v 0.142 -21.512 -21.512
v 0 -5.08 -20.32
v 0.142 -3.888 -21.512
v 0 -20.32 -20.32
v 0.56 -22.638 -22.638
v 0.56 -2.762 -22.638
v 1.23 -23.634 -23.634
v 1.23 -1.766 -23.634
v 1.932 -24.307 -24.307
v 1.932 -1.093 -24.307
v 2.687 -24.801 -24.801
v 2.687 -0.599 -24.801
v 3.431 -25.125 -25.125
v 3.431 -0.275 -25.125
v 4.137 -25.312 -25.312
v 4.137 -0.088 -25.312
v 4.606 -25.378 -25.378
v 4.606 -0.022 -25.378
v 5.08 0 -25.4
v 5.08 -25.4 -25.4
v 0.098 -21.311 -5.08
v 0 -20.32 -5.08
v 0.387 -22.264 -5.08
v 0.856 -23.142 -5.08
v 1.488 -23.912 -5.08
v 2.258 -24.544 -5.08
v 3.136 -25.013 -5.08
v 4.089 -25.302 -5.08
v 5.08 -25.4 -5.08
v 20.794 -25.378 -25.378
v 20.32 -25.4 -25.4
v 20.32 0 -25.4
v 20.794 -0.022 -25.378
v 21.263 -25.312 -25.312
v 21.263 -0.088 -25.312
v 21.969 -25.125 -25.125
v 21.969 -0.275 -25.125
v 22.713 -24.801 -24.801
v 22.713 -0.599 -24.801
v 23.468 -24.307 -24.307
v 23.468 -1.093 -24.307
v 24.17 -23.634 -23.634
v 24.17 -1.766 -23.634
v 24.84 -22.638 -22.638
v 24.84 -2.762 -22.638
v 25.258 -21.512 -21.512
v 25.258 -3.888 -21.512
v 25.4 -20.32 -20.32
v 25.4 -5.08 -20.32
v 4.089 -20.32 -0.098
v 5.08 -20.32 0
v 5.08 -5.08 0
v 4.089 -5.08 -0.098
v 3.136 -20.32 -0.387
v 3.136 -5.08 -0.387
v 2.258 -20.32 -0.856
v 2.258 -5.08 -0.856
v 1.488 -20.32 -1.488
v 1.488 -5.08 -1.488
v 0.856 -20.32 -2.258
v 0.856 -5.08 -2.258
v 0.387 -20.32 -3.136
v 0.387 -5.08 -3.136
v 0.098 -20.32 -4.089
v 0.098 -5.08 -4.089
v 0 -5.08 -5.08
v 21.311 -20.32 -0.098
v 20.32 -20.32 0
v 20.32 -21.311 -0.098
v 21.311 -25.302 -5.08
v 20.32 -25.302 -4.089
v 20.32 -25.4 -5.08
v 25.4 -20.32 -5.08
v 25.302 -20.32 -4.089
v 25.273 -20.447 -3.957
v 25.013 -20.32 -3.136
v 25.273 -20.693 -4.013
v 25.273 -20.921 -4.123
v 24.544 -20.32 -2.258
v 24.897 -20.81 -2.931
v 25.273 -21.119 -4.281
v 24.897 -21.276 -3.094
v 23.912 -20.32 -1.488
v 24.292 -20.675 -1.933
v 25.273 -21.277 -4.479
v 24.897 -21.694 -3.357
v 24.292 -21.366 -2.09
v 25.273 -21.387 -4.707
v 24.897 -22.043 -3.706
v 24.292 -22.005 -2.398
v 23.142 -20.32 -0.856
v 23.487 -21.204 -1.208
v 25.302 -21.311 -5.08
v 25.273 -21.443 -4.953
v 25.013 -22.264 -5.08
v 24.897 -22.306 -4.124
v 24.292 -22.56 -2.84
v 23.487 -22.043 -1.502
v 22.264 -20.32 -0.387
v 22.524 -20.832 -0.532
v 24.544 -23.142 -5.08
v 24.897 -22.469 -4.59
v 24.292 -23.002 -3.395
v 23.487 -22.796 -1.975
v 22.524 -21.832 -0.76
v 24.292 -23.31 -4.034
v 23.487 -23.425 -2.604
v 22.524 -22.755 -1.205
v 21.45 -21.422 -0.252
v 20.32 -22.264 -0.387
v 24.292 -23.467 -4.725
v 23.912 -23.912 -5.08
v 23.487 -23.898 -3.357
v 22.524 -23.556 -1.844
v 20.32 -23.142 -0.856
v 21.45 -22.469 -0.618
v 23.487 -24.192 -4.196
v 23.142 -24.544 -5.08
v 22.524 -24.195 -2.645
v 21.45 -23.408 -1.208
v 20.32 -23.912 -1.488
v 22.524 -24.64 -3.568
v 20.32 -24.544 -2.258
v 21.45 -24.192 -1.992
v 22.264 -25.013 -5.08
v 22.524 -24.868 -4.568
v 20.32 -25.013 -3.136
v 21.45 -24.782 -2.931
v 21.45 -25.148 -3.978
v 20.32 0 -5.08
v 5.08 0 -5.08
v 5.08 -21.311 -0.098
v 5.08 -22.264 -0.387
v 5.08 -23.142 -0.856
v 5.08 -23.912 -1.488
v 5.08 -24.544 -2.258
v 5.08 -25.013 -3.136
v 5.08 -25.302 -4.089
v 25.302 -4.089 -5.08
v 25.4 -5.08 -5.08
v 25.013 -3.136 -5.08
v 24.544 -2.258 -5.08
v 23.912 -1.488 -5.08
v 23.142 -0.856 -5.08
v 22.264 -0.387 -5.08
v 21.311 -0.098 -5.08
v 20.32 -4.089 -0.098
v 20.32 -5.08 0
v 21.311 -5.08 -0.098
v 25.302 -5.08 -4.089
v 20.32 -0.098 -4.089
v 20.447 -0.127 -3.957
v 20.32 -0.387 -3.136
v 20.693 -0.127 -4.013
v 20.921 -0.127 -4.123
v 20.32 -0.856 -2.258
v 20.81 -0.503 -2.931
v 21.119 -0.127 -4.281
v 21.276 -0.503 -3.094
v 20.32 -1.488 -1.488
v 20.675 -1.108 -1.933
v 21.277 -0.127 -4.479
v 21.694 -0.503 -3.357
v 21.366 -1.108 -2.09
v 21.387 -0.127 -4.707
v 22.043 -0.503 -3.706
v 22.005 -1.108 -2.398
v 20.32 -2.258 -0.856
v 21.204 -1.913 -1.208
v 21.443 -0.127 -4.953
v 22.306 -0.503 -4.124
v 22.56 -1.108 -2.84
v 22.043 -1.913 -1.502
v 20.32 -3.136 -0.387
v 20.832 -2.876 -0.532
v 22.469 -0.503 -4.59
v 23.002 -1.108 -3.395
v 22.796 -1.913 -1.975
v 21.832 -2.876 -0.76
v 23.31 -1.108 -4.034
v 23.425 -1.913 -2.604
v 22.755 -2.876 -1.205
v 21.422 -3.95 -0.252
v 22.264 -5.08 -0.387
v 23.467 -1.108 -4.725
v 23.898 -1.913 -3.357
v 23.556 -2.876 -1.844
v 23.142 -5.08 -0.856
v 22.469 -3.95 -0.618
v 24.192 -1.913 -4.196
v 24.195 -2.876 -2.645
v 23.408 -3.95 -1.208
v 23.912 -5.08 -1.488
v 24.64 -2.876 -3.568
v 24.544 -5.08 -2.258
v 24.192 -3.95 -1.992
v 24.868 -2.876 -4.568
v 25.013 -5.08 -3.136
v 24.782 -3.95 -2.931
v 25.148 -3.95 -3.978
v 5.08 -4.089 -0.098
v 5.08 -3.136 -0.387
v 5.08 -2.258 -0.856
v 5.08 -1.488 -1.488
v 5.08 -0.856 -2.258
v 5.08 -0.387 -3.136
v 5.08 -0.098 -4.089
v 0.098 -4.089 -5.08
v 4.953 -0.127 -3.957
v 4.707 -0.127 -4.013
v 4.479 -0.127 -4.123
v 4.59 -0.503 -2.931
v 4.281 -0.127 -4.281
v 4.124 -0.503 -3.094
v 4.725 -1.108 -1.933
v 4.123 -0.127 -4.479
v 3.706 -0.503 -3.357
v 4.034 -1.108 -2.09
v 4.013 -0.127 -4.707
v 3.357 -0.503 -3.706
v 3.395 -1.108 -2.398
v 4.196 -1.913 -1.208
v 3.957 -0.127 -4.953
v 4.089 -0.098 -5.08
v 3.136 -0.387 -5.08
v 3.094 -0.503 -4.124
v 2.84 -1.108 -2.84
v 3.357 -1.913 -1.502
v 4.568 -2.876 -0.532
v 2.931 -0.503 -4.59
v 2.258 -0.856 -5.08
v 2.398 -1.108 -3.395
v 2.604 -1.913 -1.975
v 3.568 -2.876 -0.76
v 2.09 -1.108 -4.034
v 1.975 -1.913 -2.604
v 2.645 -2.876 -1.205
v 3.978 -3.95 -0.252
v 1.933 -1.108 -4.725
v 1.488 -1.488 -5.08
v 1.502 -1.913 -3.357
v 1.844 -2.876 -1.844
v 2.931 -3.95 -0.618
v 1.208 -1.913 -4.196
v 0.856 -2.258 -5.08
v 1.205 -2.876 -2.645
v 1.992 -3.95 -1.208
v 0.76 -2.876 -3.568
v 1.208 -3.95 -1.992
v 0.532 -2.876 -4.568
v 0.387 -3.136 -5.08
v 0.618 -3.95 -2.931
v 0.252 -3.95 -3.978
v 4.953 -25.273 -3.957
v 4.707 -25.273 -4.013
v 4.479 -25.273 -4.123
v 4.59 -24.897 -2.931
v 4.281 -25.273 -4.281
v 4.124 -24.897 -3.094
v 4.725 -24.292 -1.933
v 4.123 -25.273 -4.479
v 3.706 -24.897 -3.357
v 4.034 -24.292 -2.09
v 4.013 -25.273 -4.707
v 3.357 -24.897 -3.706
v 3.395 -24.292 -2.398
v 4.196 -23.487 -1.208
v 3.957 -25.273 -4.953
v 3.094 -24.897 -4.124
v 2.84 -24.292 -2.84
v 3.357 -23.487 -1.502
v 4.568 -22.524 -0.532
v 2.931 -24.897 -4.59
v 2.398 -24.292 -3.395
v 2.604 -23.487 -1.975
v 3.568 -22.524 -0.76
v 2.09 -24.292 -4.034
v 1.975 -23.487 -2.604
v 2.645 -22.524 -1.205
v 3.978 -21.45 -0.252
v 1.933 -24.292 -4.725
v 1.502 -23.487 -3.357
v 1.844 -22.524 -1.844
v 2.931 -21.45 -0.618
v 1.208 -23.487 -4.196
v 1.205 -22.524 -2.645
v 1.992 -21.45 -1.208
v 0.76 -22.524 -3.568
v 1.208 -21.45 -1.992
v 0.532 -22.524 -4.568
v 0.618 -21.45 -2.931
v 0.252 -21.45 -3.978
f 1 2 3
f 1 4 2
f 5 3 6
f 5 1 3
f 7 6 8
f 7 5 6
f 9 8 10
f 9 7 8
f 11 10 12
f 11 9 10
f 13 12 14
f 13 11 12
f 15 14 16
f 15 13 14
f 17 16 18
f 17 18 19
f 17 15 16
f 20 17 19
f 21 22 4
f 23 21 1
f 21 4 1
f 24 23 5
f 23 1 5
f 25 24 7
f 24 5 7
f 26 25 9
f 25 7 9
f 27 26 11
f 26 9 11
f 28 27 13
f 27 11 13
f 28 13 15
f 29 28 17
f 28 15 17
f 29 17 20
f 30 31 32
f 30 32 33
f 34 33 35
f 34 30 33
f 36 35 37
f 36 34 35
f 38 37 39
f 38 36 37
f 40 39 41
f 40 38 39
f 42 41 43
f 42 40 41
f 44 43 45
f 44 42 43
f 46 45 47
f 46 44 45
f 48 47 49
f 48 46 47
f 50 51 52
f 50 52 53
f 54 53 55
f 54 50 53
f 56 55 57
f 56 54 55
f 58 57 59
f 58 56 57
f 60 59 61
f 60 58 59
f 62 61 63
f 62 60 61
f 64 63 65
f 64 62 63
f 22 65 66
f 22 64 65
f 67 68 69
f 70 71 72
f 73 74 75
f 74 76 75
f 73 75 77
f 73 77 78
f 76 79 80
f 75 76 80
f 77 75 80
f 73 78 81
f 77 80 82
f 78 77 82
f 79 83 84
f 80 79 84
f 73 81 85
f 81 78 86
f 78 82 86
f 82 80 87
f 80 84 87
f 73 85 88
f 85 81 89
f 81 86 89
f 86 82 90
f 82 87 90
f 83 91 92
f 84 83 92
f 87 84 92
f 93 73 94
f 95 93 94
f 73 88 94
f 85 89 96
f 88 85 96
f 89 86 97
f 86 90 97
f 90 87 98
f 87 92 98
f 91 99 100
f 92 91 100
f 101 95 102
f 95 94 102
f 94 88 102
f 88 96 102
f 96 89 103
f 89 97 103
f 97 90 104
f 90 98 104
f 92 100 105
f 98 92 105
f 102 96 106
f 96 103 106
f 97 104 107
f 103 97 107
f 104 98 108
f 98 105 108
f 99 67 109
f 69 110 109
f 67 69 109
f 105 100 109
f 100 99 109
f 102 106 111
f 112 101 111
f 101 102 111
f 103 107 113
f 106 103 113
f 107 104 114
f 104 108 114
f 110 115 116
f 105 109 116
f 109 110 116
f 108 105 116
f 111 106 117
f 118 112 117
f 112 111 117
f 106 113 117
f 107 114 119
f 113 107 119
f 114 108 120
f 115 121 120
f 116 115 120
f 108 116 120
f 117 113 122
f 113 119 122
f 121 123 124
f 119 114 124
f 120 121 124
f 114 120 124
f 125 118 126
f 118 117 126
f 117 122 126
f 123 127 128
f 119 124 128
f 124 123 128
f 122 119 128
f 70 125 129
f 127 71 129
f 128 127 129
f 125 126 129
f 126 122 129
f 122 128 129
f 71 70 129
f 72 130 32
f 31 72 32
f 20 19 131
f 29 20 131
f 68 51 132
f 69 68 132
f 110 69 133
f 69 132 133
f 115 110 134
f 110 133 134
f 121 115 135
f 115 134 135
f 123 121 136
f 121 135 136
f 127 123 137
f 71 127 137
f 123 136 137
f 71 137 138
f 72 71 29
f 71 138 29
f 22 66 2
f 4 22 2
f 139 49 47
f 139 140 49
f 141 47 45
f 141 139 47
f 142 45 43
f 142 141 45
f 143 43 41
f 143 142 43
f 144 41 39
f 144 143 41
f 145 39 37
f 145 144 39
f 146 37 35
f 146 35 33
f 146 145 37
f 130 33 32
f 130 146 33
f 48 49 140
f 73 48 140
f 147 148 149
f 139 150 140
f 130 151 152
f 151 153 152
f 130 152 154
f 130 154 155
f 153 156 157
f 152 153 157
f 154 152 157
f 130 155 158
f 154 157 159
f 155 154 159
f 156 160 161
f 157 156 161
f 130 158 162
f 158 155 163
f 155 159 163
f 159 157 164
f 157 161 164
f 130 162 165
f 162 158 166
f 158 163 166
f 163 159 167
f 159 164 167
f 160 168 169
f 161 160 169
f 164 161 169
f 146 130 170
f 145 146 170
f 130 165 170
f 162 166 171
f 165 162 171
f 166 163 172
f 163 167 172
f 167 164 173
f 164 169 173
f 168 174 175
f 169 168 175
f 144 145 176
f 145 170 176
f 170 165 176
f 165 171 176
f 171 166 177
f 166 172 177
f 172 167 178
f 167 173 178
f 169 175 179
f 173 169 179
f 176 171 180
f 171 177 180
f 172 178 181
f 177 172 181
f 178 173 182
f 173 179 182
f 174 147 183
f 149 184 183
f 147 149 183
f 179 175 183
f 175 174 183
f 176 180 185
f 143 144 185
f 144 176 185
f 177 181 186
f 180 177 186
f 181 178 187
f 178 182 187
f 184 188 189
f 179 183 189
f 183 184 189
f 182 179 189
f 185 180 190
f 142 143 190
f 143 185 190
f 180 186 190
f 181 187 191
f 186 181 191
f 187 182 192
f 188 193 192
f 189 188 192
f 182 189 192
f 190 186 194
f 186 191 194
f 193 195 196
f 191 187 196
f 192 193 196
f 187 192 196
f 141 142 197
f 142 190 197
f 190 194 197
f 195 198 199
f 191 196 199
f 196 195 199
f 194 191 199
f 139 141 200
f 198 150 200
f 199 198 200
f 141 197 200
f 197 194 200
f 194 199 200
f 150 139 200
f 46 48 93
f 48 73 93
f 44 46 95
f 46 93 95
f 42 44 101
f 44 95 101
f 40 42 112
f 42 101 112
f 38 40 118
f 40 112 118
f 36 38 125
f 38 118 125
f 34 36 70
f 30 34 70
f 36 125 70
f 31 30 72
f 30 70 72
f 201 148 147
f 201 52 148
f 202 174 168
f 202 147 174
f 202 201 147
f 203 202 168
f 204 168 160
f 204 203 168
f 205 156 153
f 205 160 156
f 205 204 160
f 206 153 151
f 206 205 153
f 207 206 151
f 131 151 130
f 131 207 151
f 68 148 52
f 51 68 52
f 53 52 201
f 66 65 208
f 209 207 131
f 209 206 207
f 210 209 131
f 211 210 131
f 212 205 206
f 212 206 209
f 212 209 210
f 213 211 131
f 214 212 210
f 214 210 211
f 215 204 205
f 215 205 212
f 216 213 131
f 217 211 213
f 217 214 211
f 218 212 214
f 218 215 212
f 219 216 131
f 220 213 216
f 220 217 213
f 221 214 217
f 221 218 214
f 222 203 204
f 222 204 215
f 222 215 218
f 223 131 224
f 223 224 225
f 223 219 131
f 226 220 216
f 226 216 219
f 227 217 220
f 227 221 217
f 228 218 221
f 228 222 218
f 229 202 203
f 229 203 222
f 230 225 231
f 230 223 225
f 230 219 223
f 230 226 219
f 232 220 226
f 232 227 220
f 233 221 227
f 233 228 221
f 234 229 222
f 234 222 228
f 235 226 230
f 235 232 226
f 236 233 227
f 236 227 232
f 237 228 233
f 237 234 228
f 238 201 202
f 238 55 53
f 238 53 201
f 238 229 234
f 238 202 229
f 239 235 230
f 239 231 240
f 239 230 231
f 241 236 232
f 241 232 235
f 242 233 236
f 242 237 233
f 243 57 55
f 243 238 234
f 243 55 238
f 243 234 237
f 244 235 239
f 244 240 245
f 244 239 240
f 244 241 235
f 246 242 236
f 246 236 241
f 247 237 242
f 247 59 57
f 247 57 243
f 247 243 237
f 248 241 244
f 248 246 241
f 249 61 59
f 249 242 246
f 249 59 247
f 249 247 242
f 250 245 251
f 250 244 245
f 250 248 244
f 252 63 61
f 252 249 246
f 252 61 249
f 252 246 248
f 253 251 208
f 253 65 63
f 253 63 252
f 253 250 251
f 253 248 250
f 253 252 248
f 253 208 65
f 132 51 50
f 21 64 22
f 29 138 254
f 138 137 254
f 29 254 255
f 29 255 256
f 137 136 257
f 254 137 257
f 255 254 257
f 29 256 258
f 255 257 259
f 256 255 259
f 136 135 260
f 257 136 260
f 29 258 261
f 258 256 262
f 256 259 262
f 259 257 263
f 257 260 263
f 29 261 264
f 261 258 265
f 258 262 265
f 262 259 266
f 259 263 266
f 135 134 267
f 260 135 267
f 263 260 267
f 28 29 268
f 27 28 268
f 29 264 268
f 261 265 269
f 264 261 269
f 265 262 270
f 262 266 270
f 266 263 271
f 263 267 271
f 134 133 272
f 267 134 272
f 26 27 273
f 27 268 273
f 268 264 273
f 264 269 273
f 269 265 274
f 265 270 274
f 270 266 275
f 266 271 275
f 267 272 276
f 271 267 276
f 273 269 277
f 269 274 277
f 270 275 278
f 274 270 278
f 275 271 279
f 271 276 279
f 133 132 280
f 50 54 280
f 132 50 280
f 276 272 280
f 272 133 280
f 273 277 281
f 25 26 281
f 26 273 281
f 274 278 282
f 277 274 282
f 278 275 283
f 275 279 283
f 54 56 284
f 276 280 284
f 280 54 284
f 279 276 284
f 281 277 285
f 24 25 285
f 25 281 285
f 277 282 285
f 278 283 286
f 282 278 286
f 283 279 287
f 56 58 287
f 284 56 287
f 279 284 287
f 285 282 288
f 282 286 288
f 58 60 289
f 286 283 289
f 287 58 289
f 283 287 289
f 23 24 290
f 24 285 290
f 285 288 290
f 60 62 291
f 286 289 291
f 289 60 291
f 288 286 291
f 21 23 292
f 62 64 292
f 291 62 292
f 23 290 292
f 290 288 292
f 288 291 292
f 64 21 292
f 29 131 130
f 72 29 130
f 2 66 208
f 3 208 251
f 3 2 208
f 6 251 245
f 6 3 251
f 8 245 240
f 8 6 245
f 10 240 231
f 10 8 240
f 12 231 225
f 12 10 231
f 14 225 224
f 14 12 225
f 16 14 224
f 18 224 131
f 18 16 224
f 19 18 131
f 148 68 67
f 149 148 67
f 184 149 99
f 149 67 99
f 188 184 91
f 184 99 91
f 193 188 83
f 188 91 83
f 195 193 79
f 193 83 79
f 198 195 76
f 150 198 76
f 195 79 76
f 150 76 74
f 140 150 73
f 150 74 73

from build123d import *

# Parameters (mm, degrees)
F1_DEPTH = 25.4
F2_R     = 5.07999


# Not quite as in the source:
# - a fillet or chamfer is up to 0.001 mm smaller than in the source, because OpenCascade refuses the exact size


with BuildPart() as f1:
    # F0 (on Front) → F1 (new body)
    with BuildSketch(Plane.XZ):
        Polygon((25.4, 0), (0, 0), (0, -25.4), (5.08, -25.4), (5.08, -5.08), (20.32, -5.08), (20.32, -25.4), (25.4, -25.4), align=None)
    extrude(amount=F1_DEPTH)

    # F2 (radius 5.08 in the source; OpenCascade refuses exactly that, so slightly less here)
    f2_edges = [f1.edges().sort_by_distance(p)[0] for p in [
        (0, -12.7, 0),
        (12.7, -25.4, 0),
        (25.4, -12.7, 0),
        (12.7, 0, 0),
        (0, -25.4, -12.7),
        (0, 0, -12.7),
        (25.4, 0, -12.7),
        (25.4, -25.4, -12.7),
        (0, -12.7, -25.4),
        (25.4, -12.7, -25.4),
    ]]
    fillet(f2_edges, radius=F2_R)


solid = f1.part
